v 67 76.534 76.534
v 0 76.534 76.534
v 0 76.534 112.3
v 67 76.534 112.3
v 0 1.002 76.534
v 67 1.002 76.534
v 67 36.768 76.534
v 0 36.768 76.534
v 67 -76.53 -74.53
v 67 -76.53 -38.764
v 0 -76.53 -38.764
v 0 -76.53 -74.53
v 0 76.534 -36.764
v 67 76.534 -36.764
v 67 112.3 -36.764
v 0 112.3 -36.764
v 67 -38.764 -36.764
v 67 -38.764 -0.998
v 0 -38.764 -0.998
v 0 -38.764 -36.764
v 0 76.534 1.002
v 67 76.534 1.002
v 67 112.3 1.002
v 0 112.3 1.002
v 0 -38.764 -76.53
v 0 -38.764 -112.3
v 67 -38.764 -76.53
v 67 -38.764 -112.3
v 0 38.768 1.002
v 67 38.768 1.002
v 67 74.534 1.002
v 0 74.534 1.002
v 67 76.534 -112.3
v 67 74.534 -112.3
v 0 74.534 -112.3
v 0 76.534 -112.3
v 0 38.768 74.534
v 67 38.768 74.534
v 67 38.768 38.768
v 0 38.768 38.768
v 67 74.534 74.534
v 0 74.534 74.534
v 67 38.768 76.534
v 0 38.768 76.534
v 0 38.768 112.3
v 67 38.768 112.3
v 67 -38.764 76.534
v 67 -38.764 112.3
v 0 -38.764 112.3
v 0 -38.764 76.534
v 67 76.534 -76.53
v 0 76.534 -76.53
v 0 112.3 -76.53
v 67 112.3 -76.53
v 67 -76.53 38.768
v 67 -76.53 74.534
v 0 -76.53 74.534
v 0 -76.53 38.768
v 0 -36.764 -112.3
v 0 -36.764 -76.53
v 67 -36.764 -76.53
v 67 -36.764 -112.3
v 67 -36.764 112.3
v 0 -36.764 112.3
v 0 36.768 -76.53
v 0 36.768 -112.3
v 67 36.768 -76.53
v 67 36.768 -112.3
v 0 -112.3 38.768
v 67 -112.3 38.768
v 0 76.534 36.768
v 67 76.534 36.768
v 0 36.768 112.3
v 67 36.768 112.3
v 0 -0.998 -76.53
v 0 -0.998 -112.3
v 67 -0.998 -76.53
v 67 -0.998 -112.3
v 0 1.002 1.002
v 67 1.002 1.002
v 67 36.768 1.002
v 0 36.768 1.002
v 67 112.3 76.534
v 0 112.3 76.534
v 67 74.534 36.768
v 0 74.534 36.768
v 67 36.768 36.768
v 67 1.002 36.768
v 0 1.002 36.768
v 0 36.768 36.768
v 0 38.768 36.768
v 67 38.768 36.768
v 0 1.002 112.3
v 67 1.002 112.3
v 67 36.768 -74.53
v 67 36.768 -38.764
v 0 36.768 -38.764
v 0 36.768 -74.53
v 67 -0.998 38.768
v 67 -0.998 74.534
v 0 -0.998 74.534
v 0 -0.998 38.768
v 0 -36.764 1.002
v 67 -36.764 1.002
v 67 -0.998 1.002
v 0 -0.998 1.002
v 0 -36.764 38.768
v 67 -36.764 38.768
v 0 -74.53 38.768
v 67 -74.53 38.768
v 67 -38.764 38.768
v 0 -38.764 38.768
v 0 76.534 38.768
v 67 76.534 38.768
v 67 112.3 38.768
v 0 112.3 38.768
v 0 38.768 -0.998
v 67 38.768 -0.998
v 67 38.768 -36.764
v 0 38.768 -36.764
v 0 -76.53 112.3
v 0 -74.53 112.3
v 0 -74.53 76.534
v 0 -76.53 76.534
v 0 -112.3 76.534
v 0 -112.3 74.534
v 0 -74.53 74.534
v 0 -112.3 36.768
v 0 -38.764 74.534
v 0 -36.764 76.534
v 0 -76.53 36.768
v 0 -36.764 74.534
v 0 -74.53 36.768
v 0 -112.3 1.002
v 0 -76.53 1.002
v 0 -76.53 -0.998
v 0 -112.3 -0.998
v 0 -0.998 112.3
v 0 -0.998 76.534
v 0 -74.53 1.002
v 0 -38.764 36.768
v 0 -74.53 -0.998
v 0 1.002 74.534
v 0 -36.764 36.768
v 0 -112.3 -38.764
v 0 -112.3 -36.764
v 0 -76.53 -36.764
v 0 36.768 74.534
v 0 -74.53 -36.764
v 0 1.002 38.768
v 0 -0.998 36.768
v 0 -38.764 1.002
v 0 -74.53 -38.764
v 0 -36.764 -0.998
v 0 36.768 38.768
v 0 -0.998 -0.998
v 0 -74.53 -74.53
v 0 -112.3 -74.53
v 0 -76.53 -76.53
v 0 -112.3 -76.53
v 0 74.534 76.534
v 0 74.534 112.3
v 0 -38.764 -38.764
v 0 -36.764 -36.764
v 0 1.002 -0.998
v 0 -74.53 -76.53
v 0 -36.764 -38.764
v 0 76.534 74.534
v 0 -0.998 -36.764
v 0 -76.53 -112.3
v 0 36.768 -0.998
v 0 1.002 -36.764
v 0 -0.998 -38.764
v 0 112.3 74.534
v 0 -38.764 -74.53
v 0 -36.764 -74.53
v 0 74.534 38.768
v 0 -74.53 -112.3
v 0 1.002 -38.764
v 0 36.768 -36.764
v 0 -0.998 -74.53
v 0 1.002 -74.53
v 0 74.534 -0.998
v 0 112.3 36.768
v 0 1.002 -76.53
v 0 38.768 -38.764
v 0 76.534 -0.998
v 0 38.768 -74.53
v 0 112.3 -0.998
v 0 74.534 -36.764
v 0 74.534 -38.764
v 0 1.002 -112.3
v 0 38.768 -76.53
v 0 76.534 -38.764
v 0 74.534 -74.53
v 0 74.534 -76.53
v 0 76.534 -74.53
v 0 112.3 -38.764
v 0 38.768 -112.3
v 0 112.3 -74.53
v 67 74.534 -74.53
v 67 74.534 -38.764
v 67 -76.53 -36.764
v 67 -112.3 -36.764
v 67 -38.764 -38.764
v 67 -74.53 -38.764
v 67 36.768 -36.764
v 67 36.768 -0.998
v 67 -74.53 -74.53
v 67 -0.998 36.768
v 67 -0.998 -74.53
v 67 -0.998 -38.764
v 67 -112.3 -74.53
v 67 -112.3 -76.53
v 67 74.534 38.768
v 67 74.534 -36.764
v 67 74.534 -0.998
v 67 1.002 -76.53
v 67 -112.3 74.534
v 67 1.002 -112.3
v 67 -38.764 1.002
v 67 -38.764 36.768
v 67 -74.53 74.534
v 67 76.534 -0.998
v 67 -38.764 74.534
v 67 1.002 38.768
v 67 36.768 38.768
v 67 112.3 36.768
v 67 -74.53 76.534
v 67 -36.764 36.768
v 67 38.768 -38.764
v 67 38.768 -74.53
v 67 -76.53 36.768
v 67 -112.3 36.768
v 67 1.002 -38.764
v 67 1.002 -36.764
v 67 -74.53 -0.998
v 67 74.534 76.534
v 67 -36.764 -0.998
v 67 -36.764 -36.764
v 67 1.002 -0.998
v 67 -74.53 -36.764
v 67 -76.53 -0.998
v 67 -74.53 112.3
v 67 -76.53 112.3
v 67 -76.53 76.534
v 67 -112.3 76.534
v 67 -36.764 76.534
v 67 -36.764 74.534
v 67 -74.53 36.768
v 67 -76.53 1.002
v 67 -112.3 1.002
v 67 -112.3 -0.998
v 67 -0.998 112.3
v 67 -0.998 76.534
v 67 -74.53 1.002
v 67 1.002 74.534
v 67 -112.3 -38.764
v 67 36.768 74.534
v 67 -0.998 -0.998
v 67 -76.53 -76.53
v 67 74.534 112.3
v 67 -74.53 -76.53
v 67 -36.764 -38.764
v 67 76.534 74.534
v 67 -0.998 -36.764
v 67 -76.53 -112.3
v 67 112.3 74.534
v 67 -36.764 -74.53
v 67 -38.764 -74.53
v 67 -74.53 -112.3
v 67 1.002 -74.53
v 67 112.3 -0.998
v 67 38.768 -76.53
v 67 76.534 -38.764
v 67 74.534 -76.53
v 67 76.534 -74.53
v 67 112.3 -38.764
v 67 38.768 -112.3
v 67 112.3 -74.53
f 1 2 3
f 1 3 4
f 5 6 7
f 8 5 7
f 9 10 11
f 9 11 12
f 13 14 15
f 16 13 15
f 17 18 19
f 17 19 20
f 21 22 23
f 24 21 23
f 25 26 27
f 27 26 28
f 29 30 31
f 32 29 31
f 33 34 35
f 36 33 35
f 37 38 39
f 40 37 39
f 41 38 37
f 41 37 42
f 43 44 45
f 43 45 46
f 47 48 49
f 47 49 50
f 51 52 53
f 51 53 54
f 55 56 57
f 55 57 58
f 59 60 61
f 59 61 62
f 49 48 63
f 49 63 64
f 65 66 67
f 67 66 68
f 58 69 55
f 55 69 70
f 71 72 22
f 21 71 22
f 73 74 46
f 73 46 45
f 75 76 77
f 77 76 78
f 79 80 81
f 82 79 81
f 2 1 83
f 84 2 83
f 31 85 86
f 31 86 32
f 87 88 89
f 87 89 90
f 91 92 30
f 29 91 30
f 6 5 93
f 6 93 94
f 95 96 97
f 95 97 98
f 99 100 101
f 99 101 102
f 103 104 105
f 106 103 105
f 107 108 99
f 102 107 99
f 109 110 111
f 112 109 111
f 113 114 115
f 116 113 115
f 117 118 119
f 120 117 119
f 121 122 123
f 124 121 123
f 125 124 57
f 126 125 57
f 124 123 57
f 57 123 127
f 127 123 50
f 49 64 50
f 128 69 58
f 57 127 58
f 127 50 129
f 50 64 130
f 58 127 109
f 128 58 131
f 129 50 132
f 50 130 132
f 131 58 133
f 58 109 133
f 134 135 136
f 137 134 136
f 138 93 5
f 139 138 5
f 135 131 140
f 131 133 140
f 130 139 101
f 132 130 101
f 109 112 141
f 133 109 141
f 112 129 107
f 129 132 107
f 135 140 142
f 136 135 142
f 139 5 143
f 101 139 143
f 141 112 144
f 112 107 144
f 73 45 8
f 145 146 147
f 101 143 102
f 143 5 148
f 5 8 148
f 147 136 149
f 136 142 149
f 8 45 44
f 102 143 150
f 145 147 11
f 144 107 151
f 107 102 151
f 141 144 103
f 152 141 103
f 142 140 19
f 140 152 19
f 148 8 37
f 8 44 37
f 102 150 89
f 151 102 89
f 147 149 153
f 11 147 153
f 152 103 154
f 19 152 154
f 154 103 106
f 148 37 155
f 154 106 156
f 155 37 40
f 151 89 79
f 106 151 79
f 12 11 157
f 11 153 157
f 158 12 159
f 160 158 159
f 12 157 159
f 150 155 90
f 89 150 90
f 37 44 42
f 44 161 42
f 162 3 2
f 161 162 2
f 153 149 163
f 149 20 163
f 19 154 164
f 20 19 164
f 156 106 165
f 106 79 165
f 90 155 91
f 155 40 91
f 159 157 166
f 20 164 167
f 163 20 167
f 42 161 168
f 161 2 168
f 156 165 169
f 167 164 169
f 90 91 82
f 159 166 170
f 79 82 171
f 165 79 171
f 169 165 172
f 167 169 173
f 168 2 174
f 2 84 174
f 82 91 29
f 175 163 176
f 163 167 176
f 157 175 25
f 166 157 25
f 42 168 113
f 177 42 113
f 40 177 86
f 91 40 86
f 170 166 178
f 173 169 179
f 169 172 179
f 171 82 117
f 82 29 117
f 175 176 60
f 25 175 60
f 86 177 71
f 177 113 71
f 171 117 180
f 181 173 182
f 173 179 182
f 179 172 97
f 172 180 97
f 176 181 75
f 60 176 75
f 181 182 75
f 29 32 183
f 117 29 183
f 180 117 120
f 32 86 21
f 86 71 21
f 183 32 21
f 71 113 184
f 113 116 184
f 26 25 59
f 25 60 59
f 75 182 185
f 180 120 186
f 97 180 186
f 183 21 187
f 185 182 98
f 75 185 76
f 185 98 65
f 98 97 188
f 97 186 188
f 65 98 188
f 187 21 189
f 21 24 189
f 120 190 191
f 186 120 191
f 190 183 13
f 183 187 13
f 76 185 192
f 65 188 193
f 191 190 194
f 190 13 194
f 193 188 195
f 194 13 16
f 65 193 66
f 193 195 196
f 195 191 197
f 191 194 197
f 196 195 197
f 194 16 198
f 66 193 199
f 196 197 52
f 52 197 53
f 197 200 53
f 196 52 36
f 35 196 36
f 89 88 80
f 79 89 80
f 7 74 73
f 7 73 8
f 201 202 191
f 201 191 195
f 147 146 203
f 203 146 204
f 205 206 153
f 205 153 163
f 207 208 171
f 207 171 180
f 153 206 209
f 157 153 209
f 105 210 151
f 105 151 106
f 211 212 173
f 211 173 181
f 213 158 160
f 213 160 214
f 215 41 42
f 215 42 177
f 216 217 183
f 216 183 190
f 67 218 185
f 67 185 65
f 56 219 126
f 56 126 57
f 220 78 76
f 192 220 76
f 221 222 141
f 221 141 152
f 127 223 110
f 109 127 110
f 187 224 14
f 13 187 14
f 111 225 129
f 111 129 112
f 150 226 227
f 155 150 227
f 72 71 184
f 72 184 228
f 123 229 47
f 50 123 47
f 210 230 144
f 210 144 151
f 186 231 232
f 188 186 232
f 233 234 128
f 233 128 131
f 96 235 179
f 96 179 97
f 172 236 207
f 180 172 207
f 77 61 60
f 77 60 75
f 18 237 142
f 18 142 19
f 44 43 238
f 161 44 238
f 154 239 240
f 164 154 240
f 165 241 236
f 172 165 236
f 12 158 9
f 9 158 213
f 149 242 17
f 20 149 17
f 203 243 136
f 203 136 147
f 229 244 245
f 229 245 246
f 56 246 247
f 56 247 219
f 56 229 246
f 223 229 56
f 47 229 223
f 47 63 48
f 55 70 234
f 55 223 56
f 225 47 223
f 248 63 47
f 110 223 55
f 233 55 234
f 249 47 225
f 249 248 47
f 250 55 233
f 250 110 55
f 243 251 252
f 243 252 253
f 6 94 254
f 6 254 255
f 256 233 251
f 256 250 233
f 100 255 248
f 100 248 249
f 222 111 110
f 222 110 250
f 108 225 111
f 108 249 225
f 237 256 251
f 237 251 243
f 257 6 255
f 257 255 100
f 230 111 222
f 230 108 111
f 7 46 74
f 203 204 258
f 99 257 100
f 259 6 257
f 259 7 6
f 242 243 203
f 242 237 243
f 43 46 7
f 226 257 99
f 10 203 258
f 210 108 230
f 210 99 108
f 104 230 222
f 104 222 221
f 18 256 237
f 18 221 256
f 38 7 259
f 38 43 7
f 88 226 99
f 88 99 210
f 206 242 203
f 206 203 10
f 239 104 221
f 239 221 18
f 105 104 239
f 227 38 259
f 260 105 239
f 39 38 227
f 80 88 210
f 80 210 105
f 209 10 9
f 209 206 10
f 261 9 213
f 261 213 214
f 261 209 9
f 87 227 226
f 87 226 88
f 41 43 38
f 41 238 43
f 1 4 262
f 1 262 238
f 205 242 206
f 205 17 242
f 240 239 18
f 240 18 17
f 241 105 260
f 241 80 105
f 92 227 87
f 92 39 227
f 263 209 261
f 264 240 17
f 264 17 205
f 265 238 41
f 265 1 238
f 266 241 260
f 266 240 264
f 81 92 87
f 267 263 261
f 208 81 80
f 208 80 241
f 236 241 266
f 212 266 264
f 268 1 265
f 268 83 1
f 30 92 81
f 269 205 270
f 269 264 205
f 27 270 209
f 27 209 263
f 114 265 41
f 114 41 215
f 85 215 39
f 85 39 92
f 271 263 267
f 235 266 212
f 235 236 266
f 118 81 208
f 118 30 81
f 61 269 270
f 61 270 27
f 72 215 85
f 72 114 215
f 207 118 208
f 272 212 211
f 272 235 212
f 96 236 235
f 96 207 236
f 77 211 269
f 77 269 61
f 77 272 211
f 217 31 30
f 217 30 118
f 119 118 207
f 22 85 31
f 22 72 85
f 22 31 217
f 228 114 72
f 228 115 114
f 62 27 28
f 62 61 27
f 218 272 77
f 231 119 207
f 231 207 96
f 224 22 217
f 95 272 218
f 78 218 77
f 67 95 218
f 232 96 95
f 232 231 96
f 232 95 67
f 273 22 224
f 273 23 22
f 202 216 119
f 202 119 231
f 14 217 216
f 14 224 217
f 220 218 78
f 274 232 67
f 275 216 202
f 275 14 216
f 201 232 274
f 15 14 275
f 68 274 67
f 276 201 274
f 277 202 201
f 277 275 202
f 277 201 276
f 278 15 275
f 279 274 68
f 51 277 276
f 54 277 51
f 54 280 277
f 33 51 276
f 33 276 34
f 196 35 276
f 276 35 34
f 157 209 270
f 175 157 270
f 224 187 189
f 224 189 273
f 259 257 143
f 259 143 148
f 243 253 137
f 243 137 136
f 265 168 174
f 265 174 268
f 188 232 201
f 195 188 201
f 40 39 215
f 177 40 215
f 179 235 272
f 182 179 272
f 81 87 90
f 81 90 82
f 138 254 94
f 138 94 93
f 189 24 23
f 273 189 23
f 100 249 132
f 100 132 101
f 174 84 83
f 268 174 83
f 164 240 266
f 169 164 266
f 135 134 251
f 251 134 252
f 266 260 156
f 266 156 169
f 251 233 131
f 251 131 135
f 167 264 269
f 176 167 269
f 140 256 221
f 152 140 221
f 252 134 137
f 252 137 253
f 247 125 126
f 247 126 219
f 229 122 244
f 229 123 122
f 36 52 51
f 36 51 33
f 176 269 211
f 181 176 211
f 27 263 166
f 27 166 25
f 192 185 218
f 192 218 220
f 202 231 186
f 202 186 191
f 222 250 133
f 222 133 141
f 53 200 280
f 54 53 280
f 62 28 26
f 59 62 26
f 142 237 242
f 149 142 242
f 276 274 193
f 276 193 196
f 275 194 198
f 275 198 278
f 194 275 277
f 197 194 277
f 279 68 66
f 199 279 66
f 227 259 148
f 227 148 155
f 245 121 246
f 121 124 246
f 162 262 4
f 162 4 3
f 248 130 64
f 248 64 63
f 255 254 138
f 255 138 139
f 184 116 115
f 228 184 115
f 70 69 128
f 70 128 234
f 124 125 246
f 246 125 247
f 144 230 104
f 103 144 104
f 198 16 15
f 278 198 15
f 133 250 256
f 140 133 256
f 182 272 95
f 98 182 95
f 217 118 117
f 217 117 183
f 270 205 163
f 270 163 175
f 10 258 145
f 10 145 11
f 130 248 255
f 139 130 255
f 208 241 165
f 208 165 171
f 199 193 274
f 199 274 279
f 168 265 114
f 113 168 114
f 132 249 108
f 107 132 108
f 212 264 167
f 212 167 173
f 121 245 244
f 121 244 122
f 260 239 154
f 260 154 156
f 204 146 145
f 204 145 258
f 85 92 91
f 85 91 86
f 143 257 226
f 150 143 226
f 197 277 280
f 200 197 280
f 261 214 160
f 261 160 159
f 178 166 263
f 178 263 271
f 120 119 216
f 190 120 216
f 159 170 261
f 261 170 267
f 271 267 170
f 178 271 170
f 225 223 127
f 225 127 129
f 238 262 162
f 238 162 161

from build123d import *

# Parameters (mm, degrees)
SKETCH1_W               = 228.6
SKETCH1_H               = 228.6
BOSS_EXTRUDE1_DEPTH     = 67
SKETCH2_W               = 35.766
SKETCH2_H               = 35.766
CUT_EXTRUDE1_DEPTH      = 76.2
CUT_EXTRUDE3_DEPTH      = 4
CUT_EXTRUDE3_DEPTH_BACK = 4
SKETCH4_W               = 67
SKETCH4_H               = 35.766
CUT_EXTRUDE4_DEPTH      = 4
CUT_EXTRUDE4_DEPTH_BACK = 4
SKETCH5_W               = 67
SKETCH5_H               = 37.77
SKETCH5_H_2             = 35.766
CUT_EXTRUDE5_DEPTH      = 4
CUT_EXTRUDE5_DEPTH_BACK = 4
SKETCH6_W               = 67
SKETCH6_H               = 35.766
SKETCH6_H_2             = 37.77
CUT_EXTRUDE6_DEPTH      = 4
CUT_EXTRUDE6_DEPTH_BACK = 4
SKETCH9_W               = 67
SKETCH9_H               = 37.766
SKETCH9_H_2             = 35.766
SKETCH9_H_3             = 37.77
SKETCH10_W              = 67
SKETCH10_H              = 2
CUT_EXTRUDE7_DEPTH      = 233.316821509
SKETCH11_W              = 67
SKETCH11_H              = 2
CUT_EXTRUDE8_DEPTH      = 231.673489808


with BuildPart() as part:
    # Sketch1 → Boss-Extrude1 (new body)
    with BuildSketch(Plane(origin=(0, 0, 0), x_dir=(0, 0, -1), z_dir=(1, 0, 0))):
        Rectangle(SKETCH1_W, SKETCH1_H)
    extrude(amount=BOSS_EXTRUDE1_DEPTH)

    # Sketch2 → Cut-Extrude1 (cut)
    with BuildSketch(Plane(origin=(67, 0, 0), x_dir=(0, 0, -1), z_dir=(1, 0, 0))):
        with Locations((-94.417, 94.417)):
            Rectangle(SKETCH2_W, SKETCH2_H)
        with Locations((-56.651, 94.417)):
            Rectangle(SKETCH2_W, SKETCH2_H)
        with Locations((18.881, 94.417)):
            Rectangle(SKETCH2_W, SKETCH2_H)
        with Locations((-18.885, 94.417)):
            Rectangle(SKETCH2_W, SKETCH2_H)
        with Locations((56.647, 94.417)):
            Rectangle(SKETCH2_W, SKETCH2_H)
        with Locations((94.413, 94.417)):
            Rectangle(SKETCH2_W, SKETCH2_H)
        with Locations((56.647, 56.651)):
            Rectangle(SKETCH2_W, SKETCH2_H)
        with Locations((94.413, 56.651)):
            Rectangle(SKETCH2_W, SKETCH2_H)
        with Locations((18.881, 56.651)):
            Rectangle(SKETCH2_W, SKETCH2_H)
        with Locations((-18.885, 56.651)):
            Rectangle(SKETCH2_W, SKETCH2_H)
        with Locations((-56.651, 56.651)):
            Rectangle(SKETCH2_W, SKETCH2_H)
        with Locations((-94.417, 56.651)):
            Rectangle(SKETCH2_W, SKETCH2_H)
        with Locations((-94.417, 18.885)):
            Rectangle(SKETCH2_W, SKETCH2_H)
        with Locations((-56.651, 18.885)):
            Rectangle(SKETCH2_W, SKETCH2_H)
        with Locations((-18.885, 18.885)):
            Rectangle(SKETCH2_W, SKETCH2_H)
        with Locations((18.881, 18.885)):
            Rectangle(SKETCH2_W, SKETCH2_H)
        with Locations((56.647, 18.885)):
            Rectangle(SKETCH2_W, SKETCH2_H)
        with Locations((94.413, 18.885)):
            Rectangle(SKETCH2_W, SKETCH2_H)
        with Locations((94.413, -18.881)):
            Rectangle(SKETCH2_W, SKETCH2_H)
        with Locations((56.647, -18.881)):
            Rectangle(SKETCH2_W, SKETCH2_H)
        with Locations((18.881, -18.881)):
            Rectangle(SKETCH2_W, SKETCH2_H)
        with Locations((-18.885, -18.881)):
            Rectangle(SKETCH2_W, SKETCH2_H)
        with Locations((-56.651, -18.881)):
            Rectangle(SKETCH2_W, SKETCH2_H)
        with Locations((-94.417, -18.881)):
            Rectangle(SKETCH2_W, SKETCH2_H)
        with Locations((56.647, -56.647)):
            Rectangle(SKETCH2_W, SKETCH2_H)
        with Locations((94.413, -56.647)):
            Rectangle(SKETCH2_W, SKETCH2_H)
        with Locations((94.413, -94.413)):
            Rectangle(SKETCH2_W, SKETCH2_H)
        with Locations((56.647, -94.413)):
            Rectangle(SKETCH2_W, SKETCH2_H)
        with Locations((18.881, -94.413)):
            Rectangle(SKETCH2_W, SKETCH2_H)
        with Locations((18.881, -56.647)):
            Rectangle(SKETCH2_W, SKETCH2_H)
        with Locations((-18.885, -56.647)):
            Rectangle(SKETCH2_W, SKETCH2_H)
        with Locations((-18.885, -94.413)):
            Rectangle(SKETCH2_W, SKETCH2_H)
        with Locations((-56.651, -94.413)):
            Rectangle(SKETCH2_W, SKETCH2_H)
        with Locations((-56.651, -56.647)):
            Rectangle(SKETCH2_W, SKETCH2_H)
        with Locations((-94.417, -94.413)):
            Rectangle(SKETCH2_W, SKETCH2_H)
        with Locations((-94.417, -56.647)):
            Rectangle(SKETCH2_W, SKETCH2_H)
    extrude(amount=-CUT_EXTRUDE1_DEPTH, mode=Mode.SUBTRACT)

    # Sketch4 → Cut-Extrude3 (cut, two sides: drawn at the far end of the back side and taken through both)
    with BuildSketch(Plane(origin=(0, -114.3, 0), x_dir=(1, 0, 0), z_dir=(0, 1, 0)).offset(-CUT_EXTRUDE3_DEPTH_BACK)):
        with Locations((33.5, -94.417)):
            Rectangle(SKETCH4_W, SKETCH4_H)
        with Locations((33.5, -56.651)):
            Rectangle(SKETCH4_W, SKETCH4_H)
        with Locations((33.5, -18.885)):
            Rectangle(SKETCH4_W, SKETCH4_H)
        with Locations((33.5, 18.881)):
            Rectangle(SKETCH4_W, SKETCH4_H)
        with Locations((33.5, 56.647)):
            Rectangle(SKETCH4_W, SKETCH4_H)
        with Locations((33.5, 94.413)):
            Rectangle(SKETCH4_W, SKETCH4_H)
    extrude(amount=CUT_EXTRUDE3_DEPTH + CUT_EXTRUDE3_DEPTH_BACK, mode=Mode.SUBTRACT)

    # Sketch5 → Cut-Extrude4 (cut, two sides: drawn at the far end of the back side and taken through both)
    with BuildSketch(Plane.XY.offset(114.3).offset(-CUT_EXTRUDE4_DEPTH_BACK)):
        with Locations((33.5, -95.415)):
            Rectangle(SKETCH5_W, SKETCH5_H)
        with Locations((33.5, -56.647)):
            Rectangle(SKETCH5_W, SKETCH5_H_2)
        with Locations((33.5, -18.881)):
            Rectangle(SKETCH5_W, SKETCH5_H_2)
        with Locations((33.5, 18.885)):
            Rectangle(SKETCH5_W, SKETCH5_H_2)
        with Locations((33.5, 56.651)):
            Rectangle(SKETCH5_W, SKETCH5_H_2)
        with Locations((33.5, 94.417)):
            Rectangle(SKETCH5_W, SKETCH5_H_2)
    extrude(amount=CUT_EXTRUDE4_DEPTH + CUT_EXTRUDE4_DEPTH_BACK, mode=Mode.SUBTRACT)

    # Sketch6 → Cut-Extrude5 (cut, two sides: drawn at the far end of the back side and taken through both)
    with BuildSketch(Plane.XY.offset(-114.3).offset(-CUT_EXTRUDE5_DEPTH_BACK)):
        with Locations((33.5, 94.417)):
            Rectangle(SKETCH6_W, SKETCH6_H)
        with Locations((33.5, 56.651)):
            Rectangle(SKETCH6_W, SKETCH6_H)
        with Locations((33.5, 18.885)):
            Rectangle(SKETCH6_W, SKETCH6_H)
        with Locations((33.5, -18.881)):
            Rectangle(SKETCH6_W, SKETCH6_H)
        with Locations((33.5, -56.647)):
            Rectangle(SKETCH6_W, SKETCH6_H)
        with Locations((33.5, -95.415)):
            Rectangle(SKETCH6_W, SKETCH6_H_2)
    extrude(amount=CUT_EXTRUDE5_DEPTH + CUT_EXTRUDE5_DEPTH_BACK, mode=Mode.SUBTRACT)

    # Sketch9 → Cut-Extrude6 (cut, two sides: drawn at the far end of the back side and taken through both)
    with BuildSketch(Plane(origin=(0, 114.3, 0), x_dir=(1, 0, 0), z_dir=(0, 1, 0)).offset(-CUT_EXTRUDE6_DEPTH_BACK)):
        with Locations((33.5, -95.417)):
            Rectangle(SKETCH9_W, SKETCH9_H)
        with Locations((33.5, -56.651)):
            Rectangle(SKETCH9_W, SKETCH9_H_2)
        with Locations((33.5, -18.885)):
            Rectangle(SKETCH9_W, SKETCH9_H_2)
        with Locations((33.5, 18.881)):
            Rectangle(SKETCH9_W, SKETCH9_H_2)
        with Locations((33.5, 56.647)):
            Rectangle(SKETCH9_W, SKETCH9_H_2)
        with Locations((33.5, 95.415)):
            Rectangle(SKETCH9_W, SKETCH9_H_3)
    extrude(amount=CUT_EXTRUDE6_DEPTH + CUT_EXTRUDE6_DEPTH_BACK, mode=Mode.SUBTRACT)

    # Sketch10 → Cut-Extrude7 (cut, through all)
    with BuildSketch(Plane.XY.offset(76.534)):
        with Locations((33.5, -113.3)):
            Rectangle(SKETCH10_W, SKETCH10_H)
        with Locations((33.5, 113.3)):
            Rectangle(SKETCH10_W, SKETCH10_H)
    extrude(amount=-CUT_EXTRUDE7_DEPTH, mode=Mode.SUBTRACT)

    # Sketch11 → Cut-Extrude8 (cut, through all)
    with BuildSketch(Plane(origin=(0, -76.53, 0), x_dir=(-1, 0, 0), z_dir=(0, -1, 0))):
        with Locations((-33.5, 113.3)):
            Rectangle(SKETCH11_W, SKETCH11_H)
        with Locations((-33.5, -113.3)):
            Rectangle(SKETCH11_W, SKETCH11_H)
    extrude(amount=-CUT_EXTRUDE8_DEPTH, mode=Mode.SUBTRACT)


solid = part.part
